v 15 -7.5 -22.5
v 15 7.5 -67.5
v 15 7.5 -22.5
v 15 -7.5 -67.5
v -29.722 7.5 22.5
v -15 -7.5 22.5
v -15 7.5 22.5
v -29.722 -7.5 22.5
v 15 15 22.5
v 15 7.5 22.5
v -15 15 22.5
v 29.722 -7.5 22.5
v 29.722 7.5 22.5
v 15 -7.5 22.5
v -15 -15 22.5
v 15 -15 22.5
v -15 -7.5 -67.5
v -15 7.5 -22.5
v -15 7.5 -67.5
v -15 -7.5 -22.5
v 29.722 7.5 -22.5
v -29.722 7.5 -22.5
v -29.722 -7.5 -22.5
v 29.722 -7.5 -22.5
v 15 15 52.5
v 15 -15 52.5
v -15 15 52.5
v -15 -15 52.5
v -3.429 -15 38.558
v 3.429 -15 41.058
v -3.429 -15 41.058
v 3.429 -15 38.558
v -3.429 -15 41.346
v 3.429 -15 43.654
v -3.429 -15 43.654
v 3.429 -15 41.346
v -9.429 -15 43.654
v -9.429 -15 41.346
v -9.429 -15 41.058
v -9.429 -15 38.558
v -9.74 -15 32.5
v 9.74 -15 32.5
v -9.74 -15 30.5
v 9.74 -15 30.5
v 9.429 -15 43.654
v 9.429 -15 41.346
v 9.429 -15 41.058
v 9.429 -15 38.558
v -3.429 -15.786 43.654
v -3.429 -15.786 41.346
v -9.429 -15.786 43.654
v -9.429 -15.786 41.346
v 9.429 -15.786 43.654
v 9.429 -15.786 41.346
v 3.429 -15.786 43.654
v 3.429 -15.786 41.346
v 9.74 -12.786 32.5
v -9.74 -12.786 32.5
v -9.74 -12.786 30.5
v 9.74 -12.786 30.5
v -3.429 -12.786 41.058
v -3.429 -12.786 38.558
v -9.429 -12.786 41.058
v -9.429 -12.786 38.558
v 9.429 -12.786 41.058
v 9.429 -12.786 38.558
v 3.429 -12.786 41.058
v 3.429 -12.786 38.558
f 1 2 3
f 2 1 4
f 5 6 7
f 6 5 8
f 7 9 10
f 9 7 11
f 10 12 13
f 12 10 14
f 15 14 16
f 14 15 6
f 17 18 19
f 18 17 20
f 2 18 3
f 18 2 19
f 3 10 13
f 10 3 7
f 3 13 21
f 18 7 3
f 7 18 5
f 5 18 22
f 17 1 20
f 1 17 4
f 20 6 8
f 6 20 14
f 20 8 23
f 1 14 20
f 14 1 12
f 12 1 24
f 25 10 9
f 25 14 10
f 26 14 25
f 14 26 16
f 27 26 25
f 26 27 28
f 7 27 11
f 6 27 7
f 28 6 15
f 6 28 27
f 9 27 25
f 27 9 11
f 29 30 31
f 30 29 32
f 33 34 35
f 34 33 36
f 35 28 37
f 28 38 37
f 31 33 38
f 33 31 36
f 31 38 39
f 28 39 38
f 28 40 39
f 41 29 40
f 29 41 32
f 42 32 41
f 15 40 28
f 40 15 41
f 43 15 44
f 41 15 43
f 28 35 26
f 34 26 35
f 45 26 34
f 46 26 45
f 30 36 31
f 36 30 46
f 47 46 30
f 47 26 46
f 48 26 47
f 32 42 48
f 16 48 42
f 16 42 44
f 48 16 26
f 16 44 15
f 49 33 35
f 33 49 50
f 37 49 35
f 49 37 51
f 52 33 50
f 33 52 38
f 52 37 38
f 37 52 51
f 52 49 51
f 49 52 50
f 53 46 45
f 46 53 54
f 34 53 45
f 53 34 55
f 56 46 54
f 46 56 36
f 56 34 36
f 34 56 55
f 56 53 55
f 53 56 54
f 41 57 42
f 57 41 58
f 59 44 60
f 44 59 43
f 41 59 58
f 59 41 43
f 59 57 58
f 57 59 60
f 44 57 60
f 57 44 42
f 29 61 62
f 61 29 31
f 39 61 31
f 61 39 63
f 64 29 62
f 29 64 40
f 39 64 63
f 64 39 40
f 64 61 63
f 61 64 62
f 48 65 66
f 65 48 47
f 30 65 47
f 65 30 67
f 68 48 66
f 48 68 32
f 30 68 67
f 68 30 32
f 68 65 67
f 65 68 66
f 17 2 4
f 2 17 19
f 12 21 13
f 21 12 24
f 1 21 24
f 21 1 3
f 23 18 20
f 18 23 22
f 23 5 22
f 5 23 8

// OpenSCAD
/* [Global] */

// Overall size
size = 15; // [1:1:100]

/* [Head] */
//Rotation left/right
rotationLeftRightHead = 0; // [-130:130]

//Rotation up/down
rotationUpDowntHead = 0; // [-45:45]

//Rotation left eyebrow
rotationLeftEyebrow = 0; // [-10:0.5:10]
//Rotation right eyebrow
rotationRightEyebrow = 0; // [-10:0.5:10]
//Rotation mouth
rotationMouth = 0; // [-20:0.5:20]

/* [Body] */
//Rotation
bodyRotation = 0; // [-45:0.5:45]

/* [Arms] */
//Rotation left arm
rotationLeftArm = 0; // [-90:90]
//Rotation right arm
rotationRightArm = 0; // [-90:90]

/* [Legs] */
//Rotation left leg
rotationLeftLeg = 0; // [-90:90]
//Rotation right leg
rotationRightLeg = 0; // [-90:90]

module arm(size) {
    cube([size, size, size*3], center=true);
}

module leg(size) {
    cube([size, size, size*3], center=true);
    translate([0,0,size*1.5])rotate([0,90,0])cylinder(r=size/2, h=size,center=true);
}

module body(size, rotation) {
    translate([0,0,-size/4])rotate([rotation,0,0]) translate([0,0,size/4]){
    cube([size*2,size,size*3], center=true);
    translate([0,0,-size*1.5])rotate([0,90,0])cylinder(r=size/2, h=size*2, center=true);
    }
}

module head(x,y,z,rle, rre, rlm, rrm, rotationLeftRightHead,rotationUpDowntHead) {
    translate([0,0,-z/2])rotate([rotationUpDowntHead,0,rotationLeftRightHead]) {
        translate([0,0,z/2]) {
    difference() {
        union() {
            //Main head
            cube([x,y,z], center=true);
            //Left eyebrow
            translate([-x/2+x/3.5,-y/2.1,z/6])rotate([0,rle,0])cube([x/5,y/10,z/13], center=true);
            //Right eyebrow
            translate([x/2-x/3.5,-y/2.1,z/6])rotate([0,-rre,0])cube([x/5,y/10,z/13], center=true);
        };
        //Left eye
        translate([-x/2+x/3.5,-y/2.1,z/13])cube([x/5,y/10,z/12], center=true);
        //Right eye
        translate([x/2-x/3.5,-y/2.1,z/13])cube([x/5,y/10,z/12], center=true);
        //Mouth
        translate([0,-y/2.1, -z/5]) {
            translate([-x/7,0,0])rotate([0,rlm,0])cube([x/2.75, y/10, z/15], center=true);//left
            translate([x/7,0,0])rotate([0,-rrm,0])cube([x/2.75, y/10, z/15], center=true);//right
        };
     
    };
       //Mouthfix
    if (rlm > 0) {
        translate([0,-y/2+y/20, -z/3.75]) {
            translate([-x/7,0,0])rotate([0,rlm,0])cube([x/2, y/10, z/15], center=true);//left
            translate([x/7,0,0])rotate([0,-rrm,0])cube([x/2, y/10, z/15], center=true);//right
        };
    } else if (rlm < 0) {
        translate([0,-y/2+y/20, -z/7.5]) {
            translate([-x/7,0,0])rotate([0,rlm,0])cube([x/2, y/10, z/15], center=true);//left
            translate([x/7,0,0])rotate([0,-rrm,0])cube([x/2, y/10, z/15], center=true);//right
        };
    };
}
}
    
}

body(size, bodyRotation);



if (bodyRotation >= 0) {
    
    translate([0,-sin(bodyRotation)*size,size*2.5-sin(bodyRotation)*size])head(size*2, size*2, size*2, rotationLeftEyebrow, rotationRightEyebrow,rotationMouth, rotationMouth,rotationLeftRightHead,rotationUpDowntHead);
    
    translate([size/.675,-sin(bodyRotation)*size*1.25,size-sin(bodyRotation)*size/2])rotate([-rotationLeftArm,0,0])translate([0,0,-size])arm(size);
    translate([-size/.675,-sin(bodyRotation)*size*1.25,size-sin(bodyRotation)*size/2])rotate([-rotationRightArm,0,0])translate([0,0,-size])arm(size);
    
    translate([size/2,sin(bodyRotation)*size*1.25,-size*2+sin(bodyRotation)*size/2+size/2])rotate([-rotationLeftLeg,0,0])translate([0,0,-size*1.5])leg(size);
    translate([-size/2,sin(bodyRotation)*size*1.25,-size*2+sin(bodyRotation)*size/2+size/2])rotate([-rotationRightLeg,0,0])translate([0,0,-size*1.5])leg(size);
    
    
} else {
    translate([0,-sin(bodyRotation)*size,size*2.5+sin(bodyRotation)*size])head(size*2, size*2, size*2, rotationLeftEyebrow, rotationRightEyebrow,rotationMouth, rotationMouth,rotationLeftRightHead,rotationUpDowntHead);
    
    translate([size/.675,-sin(bodyRotation)*size*1.25,size+sin(bodyRotation)*size/2])rotate([-rotationLeftArm,0,0])translate([0,0,-size])arm(size);
    translate([-size/.675,-sin(bodyRotation)*size*1.25,size+sin(bodyRotation)*size/2])rotate([-rotationRightArm,0,0])translate([0,0,-size])arm(size);
    
    translate([size/2,sin(bodyRotation)*size*1.25,-size*2-sin(bodyRotation)*size/2+size/2])rotate([-rotationLeftLeg,0,0])translate([0,0,-size*1.5])leg(size);
    translate([-size/2,sin(bodyRotation)*size*1.25,-size*2-sin(bodyRotation)*size/2+size/2])rotate([-rotationRightLeg,0,0])translate([0,0,-size*1.5])leg(size);
}
